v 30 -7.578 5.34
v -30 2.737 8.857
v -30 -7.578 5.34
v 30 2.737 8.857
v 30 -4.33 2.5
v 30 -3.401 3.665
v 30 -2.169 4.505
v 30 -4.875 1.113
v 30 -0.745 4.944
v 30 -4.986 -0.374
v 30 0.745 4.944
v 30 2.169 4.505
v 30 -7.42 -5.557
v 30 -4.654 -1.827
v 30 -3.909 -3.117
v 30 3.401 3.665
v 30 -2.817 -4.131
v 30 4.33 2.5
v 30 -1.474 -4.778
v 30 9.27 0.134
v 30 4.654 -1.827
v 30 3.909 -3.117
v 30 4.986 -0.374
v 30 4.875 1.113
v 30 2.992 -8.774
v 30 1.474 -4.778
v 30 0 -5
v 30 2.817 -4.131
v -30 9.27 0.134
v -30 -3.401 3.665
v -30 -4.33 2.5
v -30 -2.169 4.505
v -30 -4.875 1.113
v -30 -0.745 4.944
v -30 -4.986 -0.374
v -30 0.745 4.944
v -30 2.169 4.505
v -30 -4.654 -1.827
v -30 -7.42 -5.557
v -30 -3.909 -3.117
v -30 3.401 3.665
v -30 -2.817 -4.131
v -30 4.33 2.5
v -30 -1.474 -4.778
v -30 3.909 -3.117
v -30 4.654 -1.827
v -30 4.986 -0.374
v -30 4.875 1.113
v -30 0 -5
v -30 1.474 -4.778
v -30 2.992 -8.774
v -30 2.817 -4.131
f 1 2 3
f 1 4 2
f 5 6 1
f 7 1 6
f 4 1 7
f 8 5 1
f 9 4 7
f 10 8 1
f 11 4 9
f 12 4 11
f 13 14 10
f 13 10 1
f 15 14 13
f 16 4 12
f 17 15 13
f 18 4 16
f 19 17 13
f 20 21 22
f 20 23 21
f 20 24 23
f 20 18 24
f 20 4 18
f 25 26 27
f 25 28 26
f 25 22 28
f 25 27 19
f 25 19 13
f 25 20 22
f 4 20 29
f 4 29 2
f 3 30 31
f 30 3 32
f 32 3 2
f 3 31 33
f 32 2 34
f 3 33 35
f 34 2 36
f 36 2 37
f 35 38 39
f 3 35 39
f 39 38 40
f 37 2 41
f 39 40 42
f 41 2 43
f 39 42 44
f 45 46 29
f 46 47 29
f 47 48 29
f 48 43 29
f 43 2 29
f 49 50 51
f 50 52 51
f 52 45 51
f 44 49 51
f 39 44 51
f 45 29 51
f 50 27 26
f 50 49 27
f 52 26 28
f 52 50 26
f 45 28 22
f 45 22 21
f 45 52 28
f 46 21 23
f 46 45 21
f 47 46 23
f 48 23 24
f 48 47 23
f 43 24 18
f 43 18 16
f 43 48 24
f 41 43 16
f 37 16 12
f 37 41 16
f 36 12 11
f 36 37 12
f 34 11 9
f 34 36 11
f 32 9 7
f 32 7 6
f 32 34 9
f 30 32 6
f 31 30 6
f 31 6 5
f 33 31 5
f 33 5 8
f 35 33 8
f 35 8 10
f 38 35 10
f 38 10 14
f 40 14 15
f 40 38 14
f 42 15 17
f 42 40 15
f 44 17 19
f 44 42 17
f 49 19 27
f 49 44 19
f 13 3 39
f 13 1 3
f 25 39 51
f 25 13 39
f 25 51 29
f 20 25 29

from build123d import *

# Parameters (mm, degrees)
SKETCH6_R           = 5
BOSS_EXTRUDE2_DEPTH = 30


with BuildPart() as part:
    # Sketch6 → Boss-Extrude2 (new body, symmetric)
    with BuildSketch(Plane(origin=(0, 0, 0), x_dir=(0, 0, -1), z_dir=(1, 0, 0))):
        Polygon((5.557116467, -7.420297103), (8.774365341, 2.99213392), (-0.134260457, 9.269537565), (-8.857342867, 2.736755355), (-5.339878485, -7.578129736), align=None)
        Circle(SKETCH6_R, mode=Mode.SUBTRACT)
    extrude(amount=BOSS_EXTRUDE2_DEPTH, both=True)


solid = part.part
